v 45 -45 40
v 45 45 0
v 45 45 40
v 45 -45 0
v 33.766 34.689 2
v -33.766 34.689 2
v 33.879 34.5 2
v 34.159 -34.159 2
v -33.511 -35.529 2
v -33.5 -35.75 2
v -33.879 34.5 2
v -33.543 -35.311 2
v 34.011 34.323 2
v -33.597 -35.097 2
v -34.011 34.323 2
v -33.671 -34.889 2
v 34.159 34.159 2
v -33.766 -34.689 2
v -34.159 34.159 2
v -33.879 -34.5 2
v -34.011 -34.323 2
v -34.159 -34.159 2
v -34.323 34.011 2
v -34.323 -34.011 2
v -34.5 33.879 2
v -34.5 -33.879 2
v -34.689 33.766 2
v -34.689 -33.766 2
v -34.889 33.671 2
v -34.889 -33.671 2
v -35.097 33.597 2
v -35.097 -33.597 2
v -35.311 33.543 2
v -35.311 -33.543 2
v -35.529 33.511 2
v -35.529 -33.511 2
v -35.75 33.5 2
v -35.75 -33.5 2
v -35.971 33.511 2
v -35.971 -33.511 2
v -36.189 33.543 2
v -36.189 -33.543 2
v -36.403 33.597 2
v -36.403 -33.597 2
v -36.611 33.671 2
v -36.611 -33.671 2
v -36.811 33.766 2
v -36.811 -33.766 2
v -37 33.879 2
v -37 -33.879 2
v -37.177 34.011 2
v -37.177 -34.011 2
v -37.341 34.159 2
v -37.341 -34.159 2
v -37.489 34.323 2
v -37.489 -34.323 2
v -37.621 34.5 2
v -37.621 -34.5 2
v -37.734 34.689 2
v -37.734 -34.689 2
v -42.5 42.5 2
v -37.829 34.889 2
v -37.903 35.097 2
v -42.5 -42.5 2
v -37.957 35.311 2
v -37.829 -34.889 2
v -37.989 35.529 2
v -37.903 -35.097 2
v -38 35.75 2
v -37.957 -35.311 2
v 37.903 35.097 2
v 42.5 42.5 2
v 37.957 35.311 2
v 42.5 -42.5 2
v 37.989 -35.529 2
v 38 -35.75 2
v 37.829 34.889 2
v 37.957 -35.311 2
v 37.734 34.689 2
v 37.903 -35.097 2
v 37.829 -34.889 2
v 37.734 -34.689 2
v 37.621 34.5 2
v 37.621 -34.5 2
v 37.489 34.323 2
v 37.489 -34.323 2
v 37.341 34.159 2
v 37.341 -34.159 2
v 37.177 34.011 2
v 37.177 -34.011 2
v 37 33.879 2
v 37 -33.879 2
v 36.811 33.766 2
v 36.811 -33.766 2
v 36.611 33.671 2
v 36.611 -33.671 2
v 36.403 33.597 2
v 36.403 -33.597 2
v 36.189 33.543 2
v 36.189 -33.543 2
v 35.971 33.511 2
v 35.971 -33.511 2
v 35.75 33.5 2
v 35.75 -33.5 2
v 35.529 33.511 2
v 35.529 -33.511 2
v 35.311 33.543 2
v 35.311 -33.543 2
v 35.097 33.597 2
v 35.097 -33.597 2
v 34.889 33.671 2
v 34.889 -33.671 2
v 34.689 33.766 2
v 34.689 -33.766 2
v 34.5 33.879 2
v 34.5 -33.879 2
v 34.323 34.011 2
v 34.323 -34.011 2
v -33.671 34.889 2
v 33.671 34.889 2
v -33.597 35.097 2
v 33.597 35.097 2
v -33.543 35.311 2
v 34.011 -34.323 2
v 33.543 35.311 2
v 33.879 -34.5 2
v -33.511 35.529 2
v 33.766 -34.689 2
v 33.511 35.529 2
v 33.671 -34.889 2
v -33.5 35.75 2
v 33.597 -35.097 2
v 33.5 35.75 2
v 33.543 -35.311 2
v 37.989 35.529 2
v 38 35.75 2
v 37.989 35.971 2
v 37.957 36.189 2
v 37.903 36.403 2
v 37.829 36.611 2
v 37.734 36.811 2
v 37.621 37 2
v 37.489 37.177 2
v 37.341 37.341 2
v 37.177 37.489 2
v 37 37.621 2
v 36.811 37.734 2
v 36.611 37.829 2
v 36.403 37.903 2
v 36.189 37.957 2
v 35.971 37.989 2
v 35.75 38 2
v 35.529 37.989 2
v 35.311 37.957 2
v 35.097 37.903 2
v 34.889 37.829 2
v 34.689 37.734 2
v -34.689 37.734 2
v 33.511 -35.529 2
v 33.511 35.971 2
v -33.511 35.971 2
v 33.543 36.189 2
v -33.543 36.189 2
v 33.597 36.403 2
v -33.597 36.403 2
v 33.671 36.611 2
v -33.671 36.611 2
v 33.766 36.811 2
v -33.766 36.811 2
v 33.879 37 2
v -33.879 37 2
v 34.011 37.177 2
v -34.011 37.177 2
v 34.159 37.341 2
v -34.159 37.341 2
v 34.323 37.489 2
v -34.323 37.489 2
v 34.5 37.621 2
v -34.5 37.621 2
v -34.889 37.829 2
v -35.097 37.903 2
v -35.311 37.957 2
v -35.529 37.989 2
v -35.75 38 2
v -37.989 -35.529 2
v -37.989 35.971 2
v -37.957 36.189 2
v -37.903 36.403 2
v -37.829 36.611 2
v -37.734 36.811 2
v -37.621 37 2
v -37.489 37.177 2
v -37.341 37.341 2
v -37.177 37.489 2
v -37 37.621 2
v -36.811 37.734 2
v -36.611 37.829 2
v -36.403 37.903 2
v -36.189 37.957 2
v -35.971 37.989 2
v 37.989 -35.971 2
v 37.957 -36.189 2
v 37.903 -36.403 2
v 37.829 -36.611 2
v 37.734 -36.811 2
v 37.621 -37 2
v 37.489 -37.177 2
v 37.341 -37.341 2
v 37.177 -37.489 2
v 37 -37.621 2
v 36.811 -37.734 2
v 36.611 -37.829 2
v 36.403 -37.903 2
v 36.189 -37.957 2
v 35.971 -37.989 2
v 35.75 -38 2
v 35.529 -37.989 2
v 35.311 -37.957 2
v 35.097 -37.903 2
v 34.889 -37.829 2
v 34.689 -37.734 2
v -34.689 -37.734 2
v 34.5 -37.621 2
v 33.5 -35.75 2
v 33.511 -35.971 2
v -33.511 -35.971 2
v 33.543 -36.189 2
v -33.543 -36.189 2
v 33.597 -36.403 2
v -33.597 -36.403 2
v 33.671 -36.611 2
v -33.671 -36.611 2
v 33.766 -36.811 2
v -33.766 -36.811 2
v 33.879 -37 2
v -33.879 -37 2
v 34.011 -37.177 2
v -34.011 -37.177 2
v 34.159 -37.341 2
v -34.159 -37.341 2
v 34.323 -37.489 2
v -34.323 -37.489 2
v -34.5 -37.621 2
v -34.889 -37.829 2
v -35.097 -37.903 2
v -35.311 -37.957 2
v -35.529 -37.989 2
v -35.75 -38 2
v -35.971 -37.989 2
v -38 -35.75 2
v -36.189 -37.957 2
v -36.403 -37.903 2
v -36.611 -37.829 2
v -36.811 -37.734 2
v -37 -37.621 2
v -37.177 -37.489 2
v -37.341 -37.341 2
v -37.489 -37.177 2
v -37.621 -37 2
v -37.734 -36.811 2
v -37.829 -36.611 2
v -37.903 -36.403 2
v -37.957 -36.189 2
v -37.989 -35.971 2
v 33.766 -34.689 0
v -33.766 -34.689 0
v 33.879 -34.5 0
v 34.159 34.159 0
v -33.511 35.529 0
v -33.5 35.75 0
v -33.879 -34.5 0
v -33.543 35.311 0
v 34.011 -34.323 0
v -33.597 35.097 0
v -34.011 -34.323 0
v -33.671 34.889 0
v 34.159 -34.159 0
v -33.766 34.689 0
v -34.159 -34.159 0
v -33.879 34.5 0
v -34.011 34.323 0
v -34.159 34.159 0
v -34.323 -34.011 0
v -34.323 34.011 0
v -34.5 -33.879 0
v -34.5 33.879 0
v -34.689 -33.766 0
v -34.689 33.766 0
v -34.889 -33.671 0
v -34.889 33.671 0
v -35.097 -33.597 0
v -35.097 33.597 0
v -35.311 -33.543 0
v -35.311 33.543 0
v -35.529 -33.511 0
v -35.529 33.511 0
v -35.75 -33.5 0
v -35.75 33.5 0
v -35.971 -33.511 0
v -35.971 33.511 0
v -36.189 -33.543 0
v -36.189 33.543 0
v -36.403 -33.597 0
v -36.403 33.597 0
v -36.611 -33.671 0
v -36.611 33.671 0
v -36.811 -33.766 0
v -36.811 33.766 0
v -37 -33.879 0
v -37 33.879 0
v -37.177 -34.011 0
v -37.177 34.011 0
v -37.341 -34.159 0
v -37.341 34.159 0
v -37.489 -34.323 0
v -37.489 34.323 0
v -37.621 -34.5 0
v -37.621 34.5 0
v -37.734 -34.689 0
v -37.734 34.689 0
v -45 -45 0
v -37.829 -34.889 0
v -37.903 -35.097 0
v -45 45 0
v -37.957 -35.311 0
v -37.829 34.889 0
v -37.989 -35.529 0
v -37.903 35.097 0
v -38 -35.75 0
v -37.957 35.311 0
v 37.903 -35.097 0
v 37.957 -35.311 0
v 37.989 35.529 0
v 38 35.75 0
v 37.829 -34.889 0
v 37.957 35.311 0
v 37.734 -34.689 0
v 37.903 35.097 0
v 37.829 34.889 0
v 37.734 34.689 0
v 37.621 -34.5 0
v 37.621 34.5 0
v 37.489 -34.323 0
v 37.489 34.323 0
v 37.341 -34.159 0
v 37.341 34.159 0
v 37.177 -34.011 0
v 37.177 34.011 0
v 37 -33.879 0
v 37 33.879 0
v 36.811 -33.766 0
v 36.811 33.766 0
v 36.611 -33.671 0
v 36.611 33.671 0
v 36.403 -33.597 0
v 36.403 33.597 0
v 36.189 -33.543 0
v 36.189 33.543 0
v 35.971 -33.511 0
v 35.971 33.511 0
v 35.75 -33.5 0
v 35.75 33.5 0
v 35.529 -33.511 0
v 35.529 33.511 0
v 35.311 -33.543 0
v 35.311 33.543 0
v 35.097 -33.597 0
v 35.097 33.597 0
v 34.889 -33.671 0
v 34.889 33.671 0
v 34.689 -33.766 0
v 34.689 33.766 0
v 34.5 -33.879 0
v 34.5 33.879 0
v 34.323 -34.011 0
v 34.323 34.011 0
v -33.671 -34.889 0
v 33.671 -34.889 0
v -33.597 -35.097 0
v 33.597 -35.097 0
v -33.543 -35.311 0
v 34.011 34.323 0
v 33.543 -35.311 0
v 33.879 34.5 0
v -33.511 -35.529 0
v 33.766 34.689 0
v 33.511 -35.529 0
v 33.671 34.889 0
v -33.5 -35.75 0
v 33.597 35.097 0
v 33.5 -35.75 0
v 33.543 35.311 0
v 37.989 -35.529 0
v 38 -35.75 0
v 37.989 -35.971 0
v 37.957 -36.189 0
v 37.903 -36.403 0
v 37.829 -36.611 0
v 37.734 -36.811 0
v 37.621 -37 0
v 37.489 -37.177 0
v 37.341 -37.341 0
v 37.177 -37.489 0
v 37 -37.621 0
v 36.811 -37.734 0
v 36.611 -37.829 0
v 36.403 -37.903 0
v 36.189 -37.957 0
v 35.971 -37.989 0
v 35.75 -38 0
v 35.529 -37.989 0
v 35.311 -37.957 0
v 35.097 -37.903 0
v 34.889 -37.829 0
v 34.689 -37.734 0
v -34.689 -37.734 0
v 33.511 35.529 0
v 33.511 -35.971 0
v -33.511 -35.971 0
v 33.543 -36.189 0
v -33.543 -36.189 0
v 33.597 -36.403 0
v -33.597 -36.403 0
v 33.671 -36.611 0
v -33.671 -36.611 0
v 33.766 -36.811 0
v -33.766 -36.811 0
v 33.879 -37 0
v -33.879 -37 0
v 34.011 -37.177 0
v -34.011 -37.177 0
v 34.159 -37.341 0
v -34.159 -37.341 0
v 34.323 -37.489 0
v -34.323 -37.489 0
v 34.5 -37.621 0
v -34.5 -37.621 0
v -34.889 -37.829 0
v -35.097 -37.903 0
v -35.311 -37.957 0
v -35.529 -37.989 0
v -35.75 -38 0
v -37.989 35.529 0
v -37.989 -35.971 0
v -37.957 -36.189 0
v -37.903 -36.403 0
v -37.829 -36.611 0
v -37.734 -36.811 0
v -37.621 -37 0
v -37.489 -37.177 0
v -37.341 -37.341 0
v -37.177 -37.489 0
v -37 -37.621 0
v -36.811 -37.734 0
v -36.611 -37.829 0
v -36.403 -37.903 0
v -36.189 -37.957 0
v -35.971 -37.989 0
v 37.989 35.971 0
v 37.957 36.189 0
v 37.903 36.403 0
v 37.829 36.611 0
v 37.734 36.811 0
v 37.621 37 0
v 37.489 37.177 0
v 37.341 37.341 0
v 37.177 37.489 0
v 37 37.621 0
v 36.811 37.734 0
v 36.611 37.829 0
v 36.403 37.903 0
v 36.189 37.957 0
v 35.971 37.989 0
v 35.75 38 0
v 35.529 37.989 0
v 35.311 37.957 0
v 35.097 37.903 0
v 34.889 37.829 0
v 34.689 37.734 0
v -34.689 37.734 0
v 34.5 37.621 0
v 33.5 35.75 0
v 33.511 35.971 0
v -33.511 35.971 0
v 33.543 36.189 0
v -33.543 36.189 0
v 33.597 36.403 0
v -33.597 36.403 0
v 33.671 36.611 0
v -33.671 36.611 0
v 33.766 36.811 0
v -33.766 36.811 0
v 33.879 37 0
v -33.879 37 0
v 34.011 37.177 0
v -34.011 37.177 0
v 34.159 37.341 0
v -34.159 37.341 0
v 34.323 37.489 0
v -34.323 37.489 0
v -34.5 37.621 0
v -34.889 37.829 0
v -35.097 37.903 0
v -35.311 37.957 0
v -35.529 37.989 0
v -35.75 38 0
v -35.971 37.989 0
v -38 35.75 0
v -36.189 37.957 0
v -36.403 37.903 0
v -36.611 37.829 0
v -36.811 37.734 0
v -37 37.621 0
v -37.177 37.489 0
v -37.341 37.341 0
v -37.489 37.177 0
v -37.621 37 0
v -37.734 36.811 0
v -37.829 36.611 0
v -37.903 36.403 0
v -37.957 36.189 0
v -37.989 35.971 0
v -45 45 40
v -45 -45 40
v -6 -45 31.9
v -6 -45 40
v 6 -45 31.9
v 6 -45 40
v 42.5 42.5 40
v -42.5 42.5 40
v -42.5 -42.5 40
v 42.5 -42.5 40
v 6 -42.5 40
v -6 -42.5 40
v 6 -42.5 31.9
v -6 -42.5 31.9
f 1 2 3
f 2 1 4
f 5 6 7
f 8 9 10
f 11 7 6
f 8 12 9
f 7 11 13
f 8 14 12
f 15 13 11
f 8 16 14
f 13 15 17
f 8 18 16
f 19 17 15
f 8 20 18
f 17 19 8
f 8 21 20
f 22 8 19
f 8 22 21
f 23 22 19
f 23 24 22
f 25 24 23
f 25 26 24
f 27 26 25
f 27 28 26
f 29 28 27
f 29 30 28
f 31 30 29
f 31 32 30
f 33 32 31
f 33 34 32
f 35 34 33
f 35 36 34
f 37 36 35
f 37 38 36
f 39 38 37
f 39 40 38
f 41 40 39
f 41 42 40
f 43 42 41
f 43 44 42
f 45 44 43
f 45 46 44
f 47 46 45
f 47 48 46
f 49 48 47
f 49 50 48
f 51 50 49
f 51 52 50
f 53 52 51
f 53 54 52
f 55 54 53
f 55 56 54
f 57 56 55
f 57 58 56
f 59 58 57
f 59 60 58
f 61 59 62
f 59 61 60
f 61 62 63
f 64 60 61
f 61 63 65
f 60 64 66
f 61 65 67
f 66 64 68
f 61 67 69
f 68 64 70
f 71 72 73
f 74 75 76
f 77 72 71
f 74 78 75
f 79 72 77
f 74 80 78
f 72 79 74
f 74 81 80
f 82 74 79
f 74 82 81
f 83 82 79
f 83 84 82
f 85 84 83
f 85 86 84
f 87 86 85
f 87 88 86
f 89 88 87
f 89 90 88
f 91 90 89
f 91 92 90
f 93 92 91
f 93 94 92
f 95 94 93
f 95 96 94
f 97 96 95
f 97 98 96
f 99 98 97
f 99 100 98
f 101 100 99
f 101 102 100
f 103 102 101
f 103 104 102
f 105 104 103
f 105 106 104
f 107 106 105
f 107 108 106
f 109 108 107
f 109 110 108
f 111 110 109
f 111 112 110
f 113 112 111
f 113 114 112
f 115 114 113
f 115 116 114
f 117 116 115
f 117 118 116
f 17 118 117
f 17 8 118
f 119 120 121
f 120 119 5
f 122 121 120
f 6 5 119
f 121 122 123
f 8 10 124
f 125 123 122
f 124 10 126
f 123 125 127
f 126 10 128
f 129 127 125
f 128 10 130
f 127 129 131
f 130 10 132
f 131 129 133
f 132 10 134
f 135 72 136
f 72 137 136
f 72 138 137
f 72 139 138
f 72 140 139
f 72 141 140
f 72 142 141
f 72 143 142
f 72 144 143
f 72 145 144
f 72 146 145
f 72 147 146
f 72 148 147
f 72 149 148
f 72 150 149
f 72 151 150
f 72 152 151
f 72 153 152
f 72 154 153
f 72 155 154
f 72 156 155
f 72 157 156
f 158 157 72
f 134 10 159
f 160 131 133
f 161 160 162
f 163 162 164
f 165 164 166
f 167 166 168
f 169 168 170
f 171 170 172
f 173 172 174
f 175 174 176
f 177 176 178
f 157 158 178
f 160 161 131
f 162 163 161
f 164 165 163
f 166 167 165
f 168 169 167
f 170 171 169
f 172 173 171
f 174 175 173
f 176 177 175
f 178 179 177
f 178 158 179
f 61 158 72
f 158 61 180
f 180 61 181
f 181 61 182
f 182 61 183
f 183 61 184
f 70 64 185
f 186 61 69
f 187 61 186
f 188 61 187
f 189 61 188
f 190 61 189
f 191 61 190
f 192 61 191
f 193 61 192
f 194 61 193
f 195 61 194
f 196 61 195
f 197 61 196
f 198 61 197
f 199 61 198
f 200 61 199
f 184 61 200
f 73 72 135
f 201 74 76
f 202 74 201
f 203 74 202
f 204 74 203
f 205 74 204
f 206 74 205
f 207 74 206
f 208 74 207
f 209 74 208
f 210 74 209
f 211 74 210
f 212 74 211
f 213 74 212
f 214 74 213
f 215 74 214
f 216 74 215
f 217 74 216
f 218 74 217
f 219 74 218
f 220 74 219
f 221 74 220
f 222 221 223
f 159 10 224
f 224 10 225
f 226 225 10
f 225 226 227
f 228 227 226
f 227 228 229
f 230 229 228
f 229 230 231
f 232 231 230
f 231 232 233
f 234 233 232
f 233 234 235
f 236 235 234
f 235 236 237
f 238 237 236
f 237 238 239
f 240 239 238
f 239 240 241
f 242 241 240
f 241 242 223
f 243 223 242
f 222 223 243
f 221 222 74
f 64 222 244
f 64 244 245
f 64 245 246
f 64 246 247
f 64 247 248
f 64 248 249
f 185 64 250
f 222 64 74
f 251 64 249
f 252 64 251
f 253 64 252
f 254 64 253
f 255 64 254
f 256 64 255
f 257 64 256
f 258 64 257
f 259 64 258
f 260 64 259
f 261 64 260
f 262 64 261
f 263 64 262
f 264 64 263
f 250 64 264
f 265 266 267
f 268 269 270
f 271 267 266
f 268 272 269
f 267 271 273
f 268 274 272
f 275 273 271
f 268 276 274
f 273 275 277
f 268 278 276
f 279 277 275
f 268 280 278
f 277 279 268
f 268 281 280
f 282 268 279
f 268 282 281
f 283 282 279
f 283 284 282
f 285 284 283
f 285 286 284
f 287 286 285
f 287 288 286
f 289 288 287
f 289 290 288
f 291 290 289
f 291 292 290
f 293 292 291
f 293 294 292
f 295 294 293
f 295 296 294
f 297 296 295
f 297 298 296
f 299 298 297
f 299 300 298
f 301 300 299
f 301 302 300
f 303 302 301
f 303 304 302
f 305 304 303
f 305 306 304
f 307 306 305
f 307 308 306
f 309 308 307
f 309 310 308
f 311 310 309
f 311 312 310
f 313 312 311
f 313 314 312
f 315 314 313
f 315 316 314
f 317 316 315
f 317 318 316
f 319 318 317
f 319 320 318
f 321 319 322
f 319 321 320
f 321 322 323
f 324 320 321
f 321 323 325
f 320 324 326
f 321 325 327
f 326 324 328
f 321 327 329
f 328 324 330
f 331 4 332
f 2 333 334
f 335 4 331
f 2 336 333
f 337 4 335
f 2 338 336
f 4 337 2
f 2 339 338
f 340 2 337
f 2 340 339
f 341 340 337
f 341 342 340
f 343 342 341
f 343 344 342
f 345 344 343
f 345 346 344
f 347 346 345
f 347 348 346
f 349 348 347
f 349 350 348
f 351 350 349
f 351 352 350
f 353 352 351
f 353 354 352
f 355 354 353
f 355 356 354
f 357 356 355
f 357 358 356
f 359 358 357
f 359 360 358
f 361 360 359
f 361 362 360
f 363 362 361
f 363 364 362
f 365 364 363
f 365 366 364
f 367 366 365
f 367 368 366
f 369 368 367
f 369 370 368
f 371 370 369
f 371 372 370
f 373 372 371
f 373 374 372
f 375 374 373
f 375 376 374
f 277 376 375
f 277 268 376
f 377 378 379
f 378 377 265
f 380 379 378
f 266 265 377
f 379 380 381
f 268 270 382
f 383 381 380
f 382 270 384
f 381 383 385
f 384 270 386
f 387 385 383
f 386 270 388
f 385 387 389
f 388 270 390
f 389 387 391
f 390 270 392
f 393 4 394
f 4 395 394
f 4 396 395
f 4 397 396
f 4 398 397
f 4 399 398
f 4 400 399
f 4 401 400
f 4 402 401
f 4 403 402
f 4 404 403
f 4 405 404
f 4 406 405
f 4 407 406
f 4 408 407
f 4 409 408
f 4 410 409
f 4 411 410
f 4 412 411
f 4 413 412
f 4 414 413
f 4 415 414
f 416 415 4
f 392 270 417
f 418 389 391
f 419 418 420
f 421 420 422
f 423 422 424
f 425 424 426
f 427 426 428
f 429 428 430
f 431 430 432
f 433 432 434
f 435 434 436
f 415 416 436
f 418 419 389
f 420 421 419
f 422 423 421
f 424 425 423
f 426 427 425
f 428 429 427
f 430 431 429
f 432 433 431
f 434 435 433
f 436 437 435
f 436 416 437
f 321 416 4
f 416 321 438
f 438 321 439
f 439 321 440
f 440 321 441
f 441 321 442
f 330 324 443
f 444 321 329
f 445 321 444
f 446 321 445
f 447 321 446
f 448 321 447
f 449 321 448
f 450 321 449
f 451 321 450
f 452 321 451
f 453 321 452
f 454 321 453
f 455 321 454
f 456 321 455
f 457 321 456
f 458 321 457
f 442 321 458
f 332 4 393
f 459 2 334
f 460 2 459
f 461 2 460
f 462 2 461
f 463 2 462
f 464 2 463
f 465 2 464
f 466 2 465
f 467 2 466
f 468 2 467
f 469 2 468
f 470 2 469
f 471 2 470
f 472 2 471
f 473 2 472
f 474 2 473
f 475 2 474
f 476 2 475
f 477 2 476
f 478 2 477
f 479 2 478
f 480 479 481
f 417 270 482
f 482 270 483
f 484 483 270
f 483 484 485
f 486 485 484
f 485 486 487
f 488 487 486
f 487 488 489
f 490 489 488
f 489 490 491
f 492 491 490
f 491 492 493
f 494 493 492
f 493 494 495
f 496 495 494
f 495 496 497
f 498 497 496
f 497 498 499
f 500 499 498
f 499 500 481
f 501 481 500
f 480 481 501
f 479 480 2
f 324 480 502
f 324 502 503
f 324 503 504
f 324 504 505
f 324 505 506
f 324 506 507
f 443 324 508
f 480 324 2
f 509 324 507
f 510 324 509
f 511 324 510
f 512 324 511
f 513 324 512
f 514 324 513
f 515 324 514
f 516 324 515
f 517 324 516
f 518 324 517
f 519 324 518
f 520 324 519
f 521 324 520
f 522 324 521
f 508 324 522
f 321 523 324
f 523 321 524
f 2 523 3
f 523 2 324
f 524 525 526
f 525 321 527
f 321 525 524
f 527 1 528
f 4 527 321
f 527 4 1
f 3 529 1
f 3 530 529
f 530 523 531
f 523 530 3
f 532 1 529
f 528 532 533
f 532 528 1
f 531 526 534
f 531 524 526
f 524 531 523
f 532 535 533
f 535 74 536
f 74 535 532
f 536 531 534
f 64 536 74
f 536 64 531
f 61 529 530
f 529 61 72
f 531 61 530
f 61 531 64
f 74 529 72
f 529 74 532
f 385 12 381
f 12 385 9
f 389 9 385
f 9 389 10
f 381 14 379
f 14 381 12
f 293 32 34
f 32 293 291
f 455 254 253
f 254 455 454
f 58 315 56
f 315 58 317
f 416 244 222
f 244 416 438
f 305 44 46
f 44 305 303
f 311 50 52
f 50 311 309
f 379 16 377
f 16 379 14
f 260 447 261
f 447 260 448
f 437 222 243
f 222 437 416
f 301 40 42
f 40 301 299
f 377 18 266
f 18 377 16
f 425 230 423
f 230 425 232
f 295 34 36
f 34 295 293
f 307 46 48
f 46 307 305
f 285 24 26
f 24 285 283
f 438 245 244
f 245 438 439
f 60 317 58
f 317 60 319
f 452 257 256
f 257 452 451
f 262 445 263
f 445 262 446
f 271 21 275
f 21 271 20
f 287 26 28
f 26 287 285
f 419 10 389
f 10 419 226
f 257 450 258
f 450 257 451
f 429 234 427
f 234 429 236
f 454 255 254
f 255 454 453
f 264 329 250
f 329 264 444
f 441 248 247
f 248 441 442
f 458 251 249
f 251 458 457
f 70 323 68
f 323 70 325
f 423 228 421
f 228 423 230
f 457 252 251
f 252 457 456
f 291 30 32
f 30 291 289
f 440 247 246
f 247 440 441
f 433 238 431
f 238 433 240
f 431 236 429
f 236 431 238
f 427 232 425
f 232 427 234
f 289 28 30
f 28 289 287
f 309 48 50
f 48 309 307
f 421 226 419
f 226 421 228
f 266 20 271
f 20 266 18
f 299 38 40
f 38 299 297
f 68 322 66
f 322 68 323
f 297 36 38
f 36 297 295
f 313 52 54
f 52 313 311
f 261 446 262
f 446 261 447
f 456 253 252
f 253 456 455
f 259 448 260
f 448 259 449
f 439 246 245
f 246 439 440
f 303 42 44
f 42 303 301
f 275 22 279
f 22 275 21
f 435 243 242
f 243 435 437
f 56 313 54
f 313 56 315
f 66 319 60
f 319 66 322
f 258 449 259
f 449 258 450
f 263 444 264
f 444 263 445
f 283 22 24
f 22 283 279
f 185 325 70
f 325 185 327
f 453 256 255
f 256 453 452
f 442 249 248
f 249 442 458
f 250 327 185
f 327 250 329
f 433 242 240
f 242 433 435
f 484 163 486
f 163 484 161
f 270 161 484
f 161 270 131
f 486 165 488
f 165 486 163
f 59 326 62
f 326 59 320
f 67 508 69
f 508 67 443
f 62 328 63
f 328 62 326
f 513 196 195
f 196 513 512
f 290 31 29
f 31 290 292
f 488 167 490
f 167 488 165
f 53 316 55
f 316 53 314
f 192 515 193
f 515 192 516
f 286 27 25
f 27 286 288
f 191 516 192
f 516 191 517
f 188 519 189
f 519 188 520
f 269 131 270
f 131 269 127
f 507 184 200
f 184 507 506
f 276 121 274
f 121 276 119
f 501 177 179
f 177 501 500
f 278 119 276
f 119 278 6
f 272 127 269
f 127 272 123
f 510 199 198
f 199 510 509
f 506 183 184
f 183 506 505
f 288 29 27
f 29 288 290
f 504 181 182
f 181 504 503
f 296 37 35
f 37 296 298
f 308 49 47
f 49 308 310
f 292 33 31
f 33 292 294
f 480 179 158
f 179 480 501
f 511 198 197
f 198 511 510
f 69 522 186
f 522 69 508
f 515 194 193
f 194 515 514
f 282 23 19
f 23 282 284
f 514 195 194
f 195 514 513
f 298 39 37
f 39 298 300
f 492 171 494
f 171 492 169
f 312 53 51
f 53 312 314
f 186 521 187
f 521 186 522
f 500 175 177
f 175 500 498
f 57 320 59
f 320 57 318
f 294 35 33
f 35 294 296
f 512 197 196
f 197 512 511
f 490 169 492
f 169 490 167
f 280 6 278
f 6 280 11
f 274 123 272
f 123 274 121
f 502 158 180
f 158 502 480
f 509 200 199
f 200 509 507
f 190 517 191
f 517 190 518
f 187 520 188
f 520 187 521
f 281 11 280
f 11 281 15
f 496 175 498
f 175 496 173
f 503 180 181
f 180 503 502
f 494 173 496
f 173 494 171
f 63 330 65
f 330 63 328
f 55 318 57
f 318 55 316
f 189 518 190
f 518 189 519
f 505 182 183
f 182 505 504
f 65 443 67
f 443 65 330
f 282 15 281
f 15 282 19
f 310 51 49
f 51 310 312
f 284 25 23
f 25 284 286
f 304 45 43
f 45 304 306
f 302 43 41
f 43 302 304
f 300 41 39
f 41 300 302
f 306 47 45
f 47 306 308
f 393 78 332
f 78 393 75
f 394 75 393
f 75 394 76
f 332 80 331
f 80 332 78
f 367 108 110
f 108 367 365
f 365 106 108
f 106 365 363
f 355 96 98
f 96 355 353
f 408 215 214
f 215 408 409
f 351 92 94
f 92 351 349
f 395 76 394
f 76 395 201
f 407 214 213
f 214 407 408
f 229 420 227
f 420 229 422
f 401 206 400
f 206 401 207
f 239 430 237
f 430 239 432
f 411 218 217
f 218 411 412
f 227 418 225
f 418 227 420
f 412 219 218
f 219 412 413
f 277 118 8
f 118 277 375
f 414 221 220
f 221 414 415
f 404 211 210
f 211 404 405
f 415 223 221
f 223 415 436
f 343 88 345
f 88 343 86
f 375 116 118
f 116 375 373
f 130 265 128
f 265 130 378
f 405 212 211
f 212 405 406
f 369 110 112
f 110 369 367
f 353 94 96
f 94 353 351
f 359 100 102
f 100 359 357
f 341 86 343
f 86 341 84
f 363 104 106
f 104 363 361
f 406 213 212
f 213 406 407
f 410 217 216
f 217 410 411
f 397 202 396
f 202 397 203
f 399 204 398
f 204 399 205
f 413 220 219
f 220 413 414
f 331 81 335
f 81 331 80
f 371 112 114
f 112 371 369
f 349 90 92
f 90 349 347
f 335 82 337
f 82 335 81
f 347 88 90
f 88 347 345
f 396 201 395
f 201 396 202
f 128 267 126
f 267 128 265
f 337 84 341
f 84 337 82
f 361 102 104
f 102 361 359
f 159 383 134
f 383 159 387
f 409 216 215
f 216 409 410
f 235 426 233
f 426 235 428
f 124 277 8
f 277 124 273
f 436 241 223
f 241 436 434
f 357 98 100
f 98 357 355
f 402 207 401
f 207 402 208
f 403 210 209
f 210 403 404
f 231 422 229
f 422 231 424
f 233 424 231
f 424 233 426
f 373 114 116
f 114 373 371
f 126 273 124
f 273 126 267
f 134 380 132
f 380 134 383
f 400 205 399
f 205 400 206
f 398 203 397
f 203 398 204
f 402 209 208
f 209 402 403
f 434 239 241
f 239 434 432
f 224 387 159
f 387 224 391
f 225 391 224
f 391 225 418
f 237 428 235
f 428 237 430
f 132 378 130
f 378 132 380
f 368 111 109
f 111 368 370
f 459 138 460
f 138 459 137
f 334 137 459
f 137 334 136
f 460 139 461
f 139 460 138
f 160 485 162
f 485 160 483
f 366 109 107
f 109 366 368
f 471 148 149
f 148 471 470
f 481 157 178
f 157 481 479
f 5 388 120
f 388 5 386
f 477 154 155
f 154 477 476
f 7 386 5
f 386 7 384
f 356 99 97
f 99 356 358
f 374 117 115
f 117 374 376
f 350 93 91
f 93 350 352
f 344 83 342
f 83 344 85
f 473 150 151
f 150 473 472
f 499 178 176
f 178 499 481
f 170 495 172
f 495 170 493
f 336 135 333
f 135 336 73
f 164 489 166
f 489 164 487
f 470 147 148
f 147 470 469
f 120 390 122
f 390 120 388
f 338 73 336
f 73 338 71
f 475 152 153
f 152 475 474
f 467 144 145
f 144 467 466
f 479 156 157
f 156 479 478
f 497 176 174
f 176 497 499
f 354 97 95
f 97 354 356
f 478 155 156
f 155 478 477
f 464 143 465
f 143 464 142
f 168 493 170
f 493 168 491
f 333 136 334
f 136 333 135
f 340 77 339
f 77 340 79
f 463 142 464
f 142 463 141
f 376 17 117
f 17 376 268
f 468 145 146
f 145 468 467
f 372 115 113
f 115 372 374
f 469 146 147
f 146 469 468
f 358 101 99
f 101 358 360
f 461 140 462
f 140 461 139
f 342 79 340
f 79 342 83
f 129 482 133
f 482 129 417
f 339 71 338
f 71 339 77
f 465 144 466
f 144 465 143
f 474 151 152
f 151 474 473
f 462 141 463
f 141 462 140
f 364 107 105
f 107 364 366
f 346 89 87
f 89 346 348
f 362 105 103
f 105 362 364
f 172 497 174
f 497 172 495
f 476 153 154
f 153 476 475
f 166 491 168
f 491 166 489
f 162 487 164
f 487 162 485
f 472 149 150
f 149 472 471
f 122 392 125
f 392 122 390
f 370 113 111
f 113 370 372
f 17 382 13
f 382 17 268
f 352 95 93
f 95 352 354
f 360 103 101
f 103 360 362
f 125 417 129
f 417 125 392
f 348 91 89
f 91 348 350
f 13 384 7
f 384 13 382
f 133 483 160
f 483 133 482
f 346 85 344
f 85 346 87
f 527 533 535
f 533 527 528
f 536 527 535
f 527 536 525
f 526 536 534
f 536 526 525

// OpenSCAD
// Magnetic mixer cage for 80 mm computer fan
// Print orientation: flat base slab on bed, walls rise upward

// Dimensions (in mm)
outer_x = 90;          // Outer dimension X
outer_y = 90;          // Outer dimension Y
height = 40;           // Total height
slab_thickness = 2;    // Top slab thickness
wall_thickness = 2.5;  // Wall thickness
hole_diameter = 4.5;   // M4 screw hole diameter
hole_spacing = 71.5;   // Square hole arrangement (center-to-center)
slot_width = 12;       // Electrical wire slot width
slot_z_start = 32;     // Slot starts at z = 32
slot_z_end = 40;       // Slot ends at z = 40

$fn = 64;

difference() {
  union() {
    // Base slab (90 x 90 x 2), centered on origin
    translate([-outer_x/2, -outer_y/2, 0])
      cube([outer_x, outer_y, slab_thickness]);
    
    // South wall (y = -45 to -42.5)
    translate([-outer_x/2, -outer_y/2, slab_thickness])
      cube([outer_x, wall_thickness, height - slab_thickness]);
    
    // North wall (y = 42.5 to 45)
    translate([-outer_x/2, outer_y/2 - wall_thickness, slab_thickness])
      cube([outer_x, wall_thickness, height - slab_thickness]);
    
    // West wall (x = -45 to -42.5)
    translate([-outer_x/2, -outer_y/2, slab_thickness])
      cube([wall_thickness, outer_y, height - slab_thickness]);
    
    // East wall (x = 42.5 to 45)
    translate([outer_x/2 - wall_thickness, -outer_y/2, slab_thickness])
      cube([wall_thickness, outer_y, height - slab_thickness]);
  }
  
  // Screw holes for M4 (4.5 mm diameter)
  // Arranged in 71.5 mm square pattern, centered
  for (x = [-hole_spacing/2, hole_spacing/2]) {
    for (y = [-hole_spacing/2, hole_spacing/2]) {
      translate([x, y, -0.1])
        cylinder(r = hole_diameter/2, h = slab_thickness + 0.2, $fn = 64);
    }
  }
  
  // Electrical wire slot on south wall
  // 12 mm wide, centered, 8 mm high (z=32 to z=40)
  translate([-slot_width/2, -outer_y/2 - 0.5, slot_z_start - 0.1])
    cube([slot_width, wall_thickness + 1, slot_z_end - slot_z_start + 0.2]);
}
